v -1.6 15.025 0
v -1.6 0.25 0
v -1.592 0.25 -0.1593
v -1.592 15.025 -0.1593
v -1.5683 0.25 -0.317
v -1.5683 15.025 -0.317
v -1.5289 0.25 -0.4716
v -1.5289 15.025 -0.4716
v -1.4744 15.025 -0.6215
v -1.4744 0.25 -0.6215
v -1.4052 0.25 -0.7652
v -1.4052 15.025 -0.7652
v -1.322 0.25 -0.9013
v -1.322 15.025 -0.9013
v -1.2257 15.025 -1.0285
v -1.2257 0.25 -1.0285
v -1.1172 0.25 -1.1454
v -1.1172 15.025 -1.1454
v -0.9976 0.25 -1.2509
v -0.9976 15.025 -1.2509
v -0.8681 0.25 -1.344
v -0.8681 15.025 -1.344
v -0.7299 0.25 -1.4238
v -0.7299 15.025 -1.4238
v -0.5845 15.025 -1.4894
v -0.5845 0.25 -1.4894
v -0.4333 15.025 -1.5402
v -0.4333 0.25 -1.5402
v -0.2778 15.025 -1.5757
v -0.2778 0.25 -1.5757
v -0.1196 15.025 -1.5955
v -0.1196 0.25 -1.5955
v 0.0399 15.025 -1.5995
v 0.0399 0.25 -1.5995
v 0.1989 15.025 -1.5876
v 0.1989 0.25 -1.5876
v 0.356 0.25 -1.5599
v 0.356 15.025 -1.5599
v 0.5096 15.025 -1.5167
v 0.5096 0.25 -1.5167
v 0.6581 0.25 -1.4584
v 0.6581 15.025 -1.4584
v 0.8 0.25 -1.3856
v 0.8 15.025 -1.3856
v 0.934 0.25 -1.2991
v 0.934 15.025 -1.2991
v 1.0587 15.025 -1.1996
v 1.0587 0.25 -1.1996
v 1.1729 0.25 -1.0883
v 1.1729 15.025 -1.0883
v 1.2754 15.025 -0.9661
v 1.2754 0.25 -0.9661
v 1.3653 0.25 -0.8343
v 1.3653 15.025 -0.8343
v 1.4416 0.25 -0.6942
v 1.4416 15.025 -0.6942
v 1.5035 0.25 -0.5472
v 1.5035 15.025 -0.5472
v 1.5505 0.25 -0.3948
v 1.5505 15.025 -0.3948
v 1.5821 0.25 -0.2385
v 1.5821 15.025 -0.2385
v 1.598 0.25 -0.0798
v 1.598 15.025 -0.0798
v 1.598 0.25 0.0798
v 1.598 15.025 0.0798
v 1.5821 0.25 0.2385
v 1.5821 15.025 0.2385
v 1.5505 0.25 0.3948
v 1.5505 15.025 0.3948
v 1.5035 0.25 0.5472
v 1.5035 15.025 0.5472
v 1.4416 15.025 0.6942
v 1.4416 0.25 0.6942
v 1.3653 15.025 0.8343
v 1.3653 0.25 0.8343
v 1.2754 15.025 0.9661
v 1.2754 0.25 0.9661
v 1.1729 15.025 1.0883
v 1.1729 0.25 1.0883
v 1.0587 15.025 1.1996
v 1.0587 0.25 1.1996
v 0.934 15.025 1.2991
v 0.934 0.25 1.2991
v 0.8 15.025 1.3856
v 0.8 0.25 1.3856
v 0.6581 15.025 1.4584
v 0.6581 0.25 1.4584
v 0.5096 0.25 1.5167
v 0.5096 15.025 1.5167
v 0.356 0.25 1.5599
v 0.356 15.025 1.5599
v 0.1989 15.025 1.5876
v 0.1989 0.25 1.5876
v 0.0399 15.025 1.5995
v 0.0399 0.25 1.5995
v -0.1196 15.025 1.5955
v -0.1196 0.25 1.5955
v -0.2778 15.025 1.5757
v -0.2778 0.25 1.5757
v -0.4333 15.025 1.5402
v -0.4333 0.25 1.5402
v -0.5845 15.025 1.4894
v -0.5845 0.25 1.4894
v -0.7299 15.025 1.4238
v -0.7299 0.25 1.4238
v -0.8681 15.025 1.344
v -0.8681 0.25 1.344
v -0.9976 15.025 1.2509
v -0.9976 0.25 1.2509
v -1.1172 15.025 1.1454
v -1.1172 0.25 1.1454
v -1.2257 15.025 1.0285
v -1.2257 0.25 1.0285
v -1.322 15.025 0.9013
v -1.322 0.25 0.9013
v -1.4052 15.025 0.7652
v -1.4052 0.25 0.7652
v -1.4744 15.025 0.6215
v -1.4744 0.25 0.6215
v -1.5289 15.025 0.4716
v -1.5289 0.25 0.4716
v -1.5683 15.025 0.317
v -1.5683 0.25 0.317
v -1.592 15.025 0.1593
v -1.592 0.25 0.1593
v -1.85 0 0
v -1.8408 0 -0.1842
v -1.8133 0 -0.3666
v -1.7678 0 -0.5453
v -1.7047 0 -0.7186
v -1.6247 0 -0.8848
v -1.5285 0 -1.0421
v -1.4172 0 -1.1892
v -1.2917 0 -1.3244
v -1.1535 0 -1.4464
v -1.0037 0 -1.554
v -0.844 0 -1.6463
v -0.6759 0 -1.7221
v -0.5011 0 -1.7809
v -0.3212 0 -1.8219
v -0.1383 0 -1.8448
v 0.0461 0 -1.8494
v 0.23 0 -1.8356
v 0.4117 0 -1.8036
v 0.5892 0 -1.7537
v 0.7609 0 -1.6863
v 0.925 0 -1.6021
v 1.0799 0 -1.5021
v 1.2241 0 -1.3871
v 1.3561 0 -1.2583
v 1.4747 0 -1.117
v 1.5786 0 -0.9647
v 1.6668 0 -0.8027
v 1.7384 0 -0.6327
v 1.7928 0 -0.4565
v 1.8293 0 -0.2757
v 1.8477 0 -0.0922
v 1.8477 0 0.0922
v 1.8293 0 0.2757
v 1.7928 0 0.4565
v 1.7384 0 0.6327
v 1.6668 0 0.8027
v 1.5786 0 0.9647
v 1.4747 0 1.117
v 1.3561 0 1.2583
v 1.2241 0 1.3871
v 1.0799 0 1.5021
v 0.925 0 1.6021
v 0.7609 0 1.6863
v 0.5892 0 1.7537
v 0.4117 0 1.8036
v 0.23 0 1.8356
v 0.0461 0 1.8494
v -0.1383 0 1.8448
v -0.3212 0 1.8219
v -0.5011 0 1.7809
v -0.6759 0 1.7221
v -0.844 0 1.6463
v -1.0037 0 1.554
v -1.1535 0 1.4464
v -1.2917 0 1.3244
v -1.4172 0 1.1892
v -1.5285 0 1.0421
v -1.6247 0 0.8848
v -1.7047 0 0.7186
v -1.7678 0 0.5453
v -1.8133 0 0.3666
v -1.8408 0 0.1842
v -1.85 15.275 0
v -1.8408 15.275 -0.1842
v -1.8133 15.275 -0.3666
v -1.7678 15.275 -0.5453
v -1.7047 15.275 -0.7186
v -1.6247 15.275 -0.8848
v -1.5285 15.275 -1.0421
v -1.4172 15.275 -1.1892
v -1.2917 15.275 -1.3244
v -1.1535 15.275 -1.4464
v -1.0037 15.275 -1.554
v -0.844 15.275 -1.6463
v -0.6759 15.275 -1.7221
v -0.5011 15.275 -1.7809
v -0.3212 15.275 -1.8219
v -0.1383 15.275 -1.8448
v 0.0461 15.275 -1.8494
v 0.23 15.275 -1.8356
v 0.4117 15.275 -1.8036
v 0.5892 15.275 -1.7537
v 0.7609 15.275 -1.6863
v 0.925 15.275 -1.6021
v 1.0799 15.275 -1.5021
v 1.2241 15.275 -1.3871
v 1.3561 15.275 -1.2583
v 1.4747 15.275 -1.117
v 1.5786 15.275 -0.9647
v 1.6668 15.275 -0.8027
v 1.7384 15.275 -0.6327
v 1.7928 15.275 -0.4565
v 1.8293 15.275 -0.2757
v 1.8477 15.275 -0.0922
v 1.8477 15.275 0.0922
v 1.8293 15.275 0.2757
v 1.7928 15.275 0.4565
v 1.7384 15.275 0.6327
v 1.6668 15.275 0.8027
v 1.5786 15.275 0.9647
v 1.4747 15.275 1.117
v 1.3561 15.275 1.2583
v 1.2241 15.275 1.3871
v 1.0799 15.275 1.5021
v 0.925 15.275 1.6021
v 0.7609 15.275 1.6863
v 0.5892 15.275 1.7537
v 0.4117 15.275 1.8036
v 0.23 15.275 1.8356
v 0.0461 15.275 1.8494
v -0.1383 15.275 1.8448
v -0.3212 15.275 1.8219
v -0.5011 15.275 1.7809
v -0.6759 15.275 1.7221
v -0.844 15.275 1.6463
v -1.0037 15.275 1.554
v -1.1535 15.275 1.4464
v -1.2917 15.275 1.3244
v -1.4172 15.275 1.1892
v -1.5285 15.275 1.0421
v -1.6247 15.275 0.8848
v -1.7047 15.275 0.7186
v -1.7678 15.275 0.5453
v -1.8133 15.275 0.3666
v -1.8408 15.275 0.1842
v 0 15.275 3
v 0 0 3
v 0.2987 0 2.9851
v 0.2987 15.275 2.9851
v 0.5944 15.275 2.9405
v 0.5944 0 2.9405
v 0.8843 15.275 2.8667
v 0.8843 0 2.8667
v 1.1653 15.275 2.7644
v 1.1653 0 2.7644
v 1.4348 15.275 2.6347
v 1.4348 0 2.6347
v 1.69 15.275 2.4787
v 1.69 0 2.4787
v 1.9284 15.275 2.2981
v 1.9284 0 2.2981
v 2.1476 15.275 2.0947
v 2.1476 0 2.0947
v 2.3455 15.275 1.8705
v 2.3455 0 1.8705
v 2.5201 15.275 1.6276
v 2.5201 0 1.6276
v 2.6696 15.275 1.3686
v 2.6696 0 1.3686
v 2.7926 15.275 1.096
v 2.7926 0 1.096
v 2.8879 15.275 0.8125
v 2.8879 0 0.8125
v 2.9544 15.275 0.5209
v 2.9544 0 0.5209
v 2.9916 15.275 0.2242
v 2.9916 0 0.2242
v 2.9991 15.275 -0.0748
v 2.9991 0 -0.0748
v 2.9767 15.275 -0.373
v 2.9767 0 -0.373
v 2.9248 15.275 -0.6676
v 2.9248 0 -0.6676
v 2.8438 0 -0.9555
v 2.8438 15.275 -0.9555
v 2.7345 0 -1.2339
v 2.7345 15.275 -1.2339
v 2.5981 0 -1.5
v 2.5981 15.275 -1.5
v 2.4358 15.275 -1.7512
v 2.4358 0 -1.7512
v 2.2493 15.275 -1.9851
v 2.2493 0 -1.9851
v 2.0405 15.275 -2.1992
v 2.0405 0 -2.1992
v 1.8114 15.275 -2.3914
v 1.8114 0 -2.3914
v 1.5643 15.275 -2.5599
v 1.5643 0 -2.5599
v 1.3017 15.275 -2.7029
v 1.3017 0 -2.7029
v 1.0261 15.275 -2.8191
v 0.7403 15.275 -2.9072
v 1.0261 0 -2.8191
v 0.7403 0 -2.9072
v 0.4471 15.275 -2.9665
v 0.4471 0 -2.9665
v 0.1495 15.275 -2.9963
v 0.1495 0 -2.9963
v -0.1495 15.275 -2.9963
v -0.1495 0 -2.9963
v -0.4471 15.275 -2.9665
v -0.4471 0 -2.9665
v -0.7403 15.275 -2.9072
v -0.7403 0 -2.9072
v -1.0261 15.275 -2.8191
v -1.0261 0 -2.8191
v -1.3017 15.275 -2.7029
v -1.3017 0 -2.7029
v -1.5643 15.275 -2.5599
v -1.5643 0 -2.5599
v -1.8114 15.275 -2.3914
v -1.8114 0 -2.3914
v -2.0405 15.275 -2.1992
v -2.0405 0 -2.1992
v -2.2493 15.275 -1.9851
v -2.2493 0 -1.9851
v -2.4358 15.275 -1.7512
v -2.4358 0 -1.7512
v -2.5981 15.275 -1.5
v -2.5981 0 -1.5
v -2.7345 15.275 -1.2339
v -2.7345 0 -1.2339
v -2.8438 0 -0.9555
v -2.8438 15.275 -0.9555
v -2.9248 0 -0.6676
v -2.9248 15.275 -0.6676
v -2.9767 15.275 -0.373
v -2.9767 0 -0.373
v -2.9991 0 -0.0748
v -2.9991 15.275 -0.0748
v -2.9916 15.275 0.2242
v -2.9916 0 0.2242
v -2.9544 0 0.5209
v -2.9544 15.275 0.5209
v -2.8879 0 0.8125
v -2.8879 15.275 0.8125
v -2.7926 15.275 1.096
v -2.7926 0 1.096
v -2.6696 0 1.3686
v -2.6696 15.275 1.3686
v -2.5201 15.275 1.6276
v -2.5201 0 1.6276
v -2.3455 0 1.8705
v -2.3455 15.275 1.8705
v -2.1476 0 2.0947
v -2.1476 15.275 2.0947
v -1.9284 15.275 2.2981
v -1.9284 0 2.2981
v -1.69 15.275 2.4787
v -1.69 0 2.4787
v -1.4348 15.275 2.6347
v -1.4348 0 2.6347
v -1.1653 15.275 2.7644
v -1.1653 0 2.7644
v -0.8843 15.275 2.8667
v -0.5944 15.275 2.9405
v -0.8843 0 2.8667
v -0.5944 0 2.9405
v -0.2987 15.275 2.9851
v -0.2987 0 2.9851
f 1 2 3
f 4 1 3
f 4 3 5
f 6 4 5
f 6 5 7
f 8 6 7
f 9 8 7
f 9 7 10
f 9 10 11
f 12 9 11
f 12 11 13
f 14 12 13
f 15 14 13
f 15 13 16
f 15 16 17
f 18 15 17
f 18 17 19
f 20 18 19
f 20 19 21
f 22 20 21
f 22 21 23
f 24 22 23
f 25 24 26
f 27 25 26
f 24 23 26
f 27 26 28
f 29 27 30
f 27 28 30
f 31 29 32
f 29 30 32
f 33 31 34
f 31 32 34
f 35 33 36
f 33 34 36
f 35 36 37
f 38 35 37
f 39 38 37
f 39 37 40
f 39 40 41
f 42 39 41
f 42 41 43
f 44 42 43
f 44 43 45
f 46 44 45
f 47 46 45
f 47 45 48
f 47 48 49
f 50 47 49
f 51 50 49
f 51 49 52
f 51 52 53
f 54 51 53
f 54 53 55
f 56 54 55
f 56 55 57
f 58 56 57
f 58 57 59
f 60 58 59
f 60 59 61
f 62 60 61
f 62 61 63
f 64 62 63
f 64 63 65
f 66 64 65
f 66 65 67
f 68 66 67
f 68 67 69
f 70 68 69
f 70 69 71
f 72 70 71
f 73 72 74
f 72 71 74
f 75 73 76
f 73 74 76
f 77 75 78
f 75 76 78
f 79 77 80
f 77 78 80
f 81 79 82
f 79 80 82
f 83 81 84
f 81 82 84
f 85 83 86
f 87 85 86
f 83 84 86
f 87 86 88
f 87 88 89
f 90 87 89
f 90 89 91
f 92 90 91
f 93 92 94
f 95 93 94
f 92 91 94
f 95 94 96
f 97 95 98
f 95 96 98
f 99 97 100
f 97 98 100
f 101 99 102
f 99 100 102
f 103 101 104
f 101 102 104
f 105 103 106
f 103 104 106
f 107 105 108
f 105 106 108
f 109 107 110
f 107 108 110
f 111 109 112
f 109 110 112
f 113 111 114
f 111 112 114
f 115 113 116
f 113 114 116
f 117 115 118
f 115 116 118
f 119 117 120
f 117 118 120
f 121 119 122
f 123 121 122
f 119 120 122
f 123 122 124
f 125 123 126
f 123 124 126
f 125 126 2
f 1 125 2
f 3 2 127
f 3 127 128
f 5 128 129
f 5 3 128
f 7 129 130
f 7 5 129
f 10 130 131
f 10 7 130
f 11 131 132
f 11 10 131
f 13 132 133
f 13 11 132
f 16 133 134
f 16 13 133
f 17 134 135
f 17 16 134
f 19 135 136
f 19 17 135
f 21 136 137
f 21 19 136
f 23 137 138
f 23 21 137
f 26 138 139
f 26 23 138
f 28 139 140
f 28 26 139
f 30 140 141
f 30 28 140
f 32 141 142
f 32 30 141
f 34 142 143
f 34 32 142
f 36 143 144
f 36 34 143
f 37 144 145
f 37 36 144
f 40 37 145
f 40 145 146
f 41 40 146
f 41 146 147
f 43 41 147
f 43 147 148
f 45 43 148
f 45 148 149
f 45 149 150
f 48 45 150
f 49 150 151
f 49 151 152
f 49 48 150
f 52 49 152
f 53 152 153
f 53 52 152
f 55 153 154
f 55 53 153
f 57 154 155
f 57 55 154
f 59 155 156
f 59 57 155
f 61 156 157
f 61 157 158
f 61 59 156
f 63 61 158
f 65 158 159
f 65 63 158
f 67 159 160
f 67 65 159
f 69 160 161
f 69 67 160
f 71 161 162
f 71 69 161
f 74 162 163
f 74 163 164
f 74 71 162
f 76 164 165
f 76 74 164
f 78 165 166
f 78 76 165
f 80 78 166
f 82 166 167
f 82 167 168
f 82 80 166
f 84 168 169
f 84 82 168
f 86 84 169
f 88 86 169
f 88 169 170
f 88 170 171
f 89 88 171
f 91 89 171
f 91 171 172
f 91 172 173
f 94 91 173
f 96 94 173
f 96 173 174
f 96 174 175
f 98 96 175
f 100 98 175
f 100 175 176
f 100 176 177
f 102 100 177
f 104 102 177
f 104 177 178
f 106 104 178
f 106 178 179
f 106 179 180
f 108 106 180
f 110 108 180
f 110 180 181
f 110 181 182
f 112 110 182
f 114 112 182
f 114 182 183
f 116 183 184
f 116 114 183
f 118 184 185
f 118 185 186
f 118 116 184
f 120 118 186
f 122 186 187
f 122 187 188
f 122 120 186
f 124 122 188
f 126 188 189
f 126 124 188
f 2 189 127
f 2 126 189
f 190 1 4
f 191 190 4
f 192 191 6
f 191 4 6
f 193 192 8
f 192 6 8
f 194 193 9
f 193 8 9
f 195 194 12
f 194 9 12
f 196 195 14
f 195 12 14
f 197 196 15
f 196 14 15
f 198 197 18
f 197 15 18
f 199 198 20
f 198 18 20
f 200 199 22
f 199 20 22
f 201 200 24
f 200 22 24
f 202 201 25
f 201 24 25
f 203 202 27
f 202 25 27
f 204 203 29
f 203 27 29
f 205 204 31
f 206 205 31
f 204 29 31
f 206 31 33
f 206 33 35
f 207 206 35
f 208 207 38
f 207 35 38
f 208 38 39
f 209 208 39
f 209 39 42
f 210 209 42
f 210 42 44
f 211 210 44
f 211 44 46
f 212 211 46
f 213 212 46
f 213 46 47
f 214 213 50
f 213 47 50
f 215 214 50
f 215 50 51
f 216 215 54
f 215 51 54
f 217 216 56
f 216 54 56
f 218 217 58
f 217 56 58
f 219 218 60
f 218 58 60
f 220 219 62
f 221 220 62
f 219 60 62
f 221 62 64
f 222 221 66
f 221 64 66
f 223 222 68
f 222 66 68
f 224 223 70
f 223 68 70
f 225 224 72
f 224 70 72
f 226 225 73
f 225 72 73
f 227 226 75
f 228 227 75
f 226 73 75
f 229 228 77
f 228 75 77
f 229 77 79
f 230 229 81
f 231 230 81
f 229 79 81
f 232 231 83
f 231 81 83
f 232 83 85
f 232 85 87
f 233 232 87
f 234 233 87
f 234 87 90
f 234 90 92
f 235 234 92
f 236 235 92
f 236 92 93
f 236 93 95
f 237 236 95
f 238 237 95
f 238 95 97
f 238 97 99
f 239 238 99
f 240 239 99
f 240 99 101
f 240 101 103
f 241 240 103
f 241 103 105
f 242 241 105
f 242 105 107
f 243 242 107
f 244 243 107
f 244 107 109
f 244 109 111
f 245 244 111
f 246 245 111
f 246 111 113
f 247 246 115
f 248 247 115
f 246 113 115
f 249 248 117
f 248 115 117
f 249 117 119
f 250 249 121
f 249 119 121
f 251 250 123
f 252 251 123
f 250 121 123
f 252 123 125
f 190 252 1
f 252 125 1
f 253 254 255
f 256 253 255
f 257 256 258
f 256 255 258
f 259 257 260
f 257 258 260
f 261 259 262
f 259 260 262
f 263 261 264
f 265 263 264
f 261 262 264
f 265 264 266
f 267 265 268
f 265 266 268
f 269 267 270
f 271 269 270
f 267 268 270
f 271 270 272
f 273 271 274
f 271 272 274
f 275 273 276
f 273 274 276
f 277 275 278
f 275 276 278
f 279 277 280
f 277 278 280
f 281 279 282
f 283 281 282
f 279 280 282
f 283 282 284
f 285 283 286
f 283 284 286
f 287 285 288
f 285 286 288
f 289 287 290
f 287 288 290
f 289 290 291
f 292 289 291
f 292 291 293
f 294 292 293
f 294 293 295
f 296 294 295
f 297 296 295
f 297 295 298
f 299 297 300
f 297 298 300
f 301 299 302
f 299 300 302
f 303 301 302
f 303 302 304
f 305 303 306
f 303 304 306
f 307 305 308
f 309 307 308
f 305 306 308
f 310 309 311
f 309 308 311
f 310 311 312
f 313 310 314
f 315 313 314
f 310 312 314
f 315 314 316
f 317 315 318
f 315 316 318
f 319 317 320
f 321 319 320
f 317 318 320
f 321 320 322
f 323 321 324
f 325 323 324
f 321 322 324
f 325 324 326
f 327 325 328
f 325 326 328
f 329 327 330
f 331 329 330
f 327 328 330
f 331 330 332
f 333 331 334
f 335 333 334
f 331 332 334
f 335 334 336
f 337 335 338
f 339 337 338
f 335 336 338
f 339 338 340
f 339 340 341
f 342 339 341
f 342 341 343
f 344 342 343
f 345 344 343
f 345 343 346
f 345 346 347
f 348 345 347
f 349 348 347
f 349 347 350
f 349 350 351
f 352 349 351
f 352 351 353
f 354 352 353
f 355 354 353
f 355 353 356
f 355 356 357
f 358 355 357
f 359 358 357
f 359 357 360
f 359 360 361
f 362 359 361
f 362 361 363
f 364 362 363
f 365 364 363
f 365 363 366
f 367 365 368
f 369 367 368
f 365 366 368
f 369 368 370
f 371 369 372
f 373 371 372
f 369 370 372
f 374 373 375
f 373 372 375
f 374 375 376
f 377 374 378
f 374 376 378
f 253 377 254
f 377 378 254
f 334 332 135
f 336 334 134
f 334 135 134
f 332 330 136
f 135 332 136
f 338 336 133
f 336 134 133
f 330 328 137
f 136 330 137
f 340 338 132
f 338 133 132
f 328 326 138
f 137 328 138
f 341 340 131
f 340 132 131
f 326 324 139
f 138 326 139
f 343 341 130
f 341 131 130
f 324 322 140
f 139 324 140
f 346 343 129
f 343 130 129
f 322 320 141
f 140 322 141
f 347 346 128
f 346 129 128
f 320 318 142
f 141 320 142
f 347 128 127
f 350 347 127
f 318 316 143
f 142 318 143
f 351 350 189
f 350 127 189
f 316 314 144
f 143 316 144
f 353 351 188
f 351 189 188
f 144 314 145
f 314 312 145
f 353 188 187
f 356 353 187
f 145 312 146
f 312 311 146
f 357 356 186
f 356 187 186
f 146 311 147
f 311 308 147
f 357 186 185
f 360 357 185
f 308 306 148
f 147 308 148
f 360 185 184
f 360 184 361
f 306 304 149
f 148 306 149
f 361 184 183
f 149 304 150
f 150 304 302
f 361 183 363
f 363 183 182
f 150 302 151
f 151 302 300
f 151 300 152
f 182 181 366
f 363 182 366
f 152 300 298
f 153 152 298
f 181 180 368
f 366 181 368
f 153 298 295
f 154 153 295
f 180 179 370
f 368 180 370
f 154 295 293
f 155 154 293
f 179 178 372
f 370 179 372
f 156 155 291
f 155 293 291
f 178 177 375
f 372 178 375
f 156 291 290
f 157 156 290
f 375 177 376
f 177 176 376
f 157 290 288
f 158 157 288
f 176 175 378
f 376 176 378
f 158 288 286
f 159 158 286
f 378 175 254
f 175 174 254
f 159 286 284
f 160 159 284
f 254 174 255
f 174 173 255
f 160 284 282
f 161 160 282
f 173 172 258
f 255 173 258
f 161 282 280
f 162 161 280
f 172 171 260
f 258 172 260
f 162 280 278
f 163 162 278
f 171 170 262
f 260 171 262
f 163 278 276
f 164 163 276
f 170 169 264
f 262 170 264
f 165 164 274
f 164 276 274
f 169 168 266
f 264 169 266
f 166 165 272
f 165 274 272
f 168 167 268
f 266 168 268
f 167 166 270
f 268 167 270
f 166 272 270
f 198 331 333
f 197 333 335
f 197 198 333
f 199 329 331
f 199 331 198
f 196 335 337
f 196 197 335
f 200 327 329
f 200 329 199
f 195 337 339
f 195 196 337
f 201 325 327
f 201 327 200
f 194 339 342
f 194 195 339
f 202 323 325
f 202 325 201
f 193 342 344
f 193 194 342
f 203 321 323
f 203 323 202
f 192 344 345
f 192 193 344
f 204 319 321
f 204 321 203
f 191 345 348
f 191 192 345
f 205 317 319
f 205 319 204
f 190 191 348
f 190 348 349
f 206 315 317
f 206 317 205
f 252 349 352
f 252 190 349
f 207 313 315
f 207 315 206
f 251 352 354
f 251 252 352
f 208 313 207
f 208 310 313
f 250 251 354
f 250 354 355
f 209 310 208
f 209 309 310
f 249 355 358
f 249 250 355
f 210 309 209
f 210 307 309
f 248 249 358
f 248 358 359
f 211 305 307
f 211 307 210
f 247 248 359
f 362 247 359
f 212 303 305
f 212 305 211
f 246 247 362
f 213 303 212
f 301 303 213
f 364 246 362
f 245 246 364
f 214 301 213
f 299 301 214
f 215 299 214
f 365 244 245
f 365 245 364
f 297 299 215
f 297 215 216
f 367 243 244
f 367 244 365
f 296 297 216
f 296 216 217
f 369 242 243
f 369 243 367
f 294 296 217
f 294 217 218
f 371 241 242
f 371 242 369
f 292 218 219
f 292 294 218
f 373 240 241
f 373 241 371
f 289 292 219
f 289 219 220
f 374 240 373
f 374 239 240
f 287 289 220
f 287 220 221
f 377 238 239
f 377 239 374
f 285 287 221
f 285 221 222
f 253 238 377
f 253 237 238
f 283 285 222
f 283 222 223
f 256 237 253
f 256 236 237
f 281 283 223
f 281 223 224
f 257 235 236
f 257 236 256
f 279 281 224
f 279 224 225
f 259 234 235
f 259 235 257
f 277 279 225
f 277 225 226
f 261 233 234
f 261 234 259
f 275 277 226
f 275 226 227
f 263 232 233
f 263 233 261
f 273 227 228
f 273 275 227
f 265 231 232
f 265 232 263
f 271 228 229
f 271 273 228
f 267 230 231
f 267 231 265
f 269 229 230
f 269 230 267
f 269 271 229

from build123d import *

# Parameters (mm, degrees)
SKETCH1_R            = 3
BOSS_EXTRUDE1_DEPTH  = 15.275
M3_CLEARANCE_HOLE1_D = 3.2
CHAMFER1_SIZE        = 0.25


with BuildPart() as part:
    # Sketch1 → Boss-Extrude1 (new body)
    with BuildSketch(Plane(origin=(0, 0, 0), x_dir=(1, 0, 0), z_dir=(0, 1, 0))):
        with Locations(Location((0, 0, 0), (0, 0, 270))):
            Circle(SKETCH1_R)
    extrude(amount=BOSS_EXTRUDE1_DEPTH)

    # M3 Clearance Hole1 (through all)
    with Locations(Plane(origin=(0, 15.275, 0), x_dir=(1, 0, 0), z_dir=(0, 1, 0))):
        with Locations((0, 0)):
            Hole(M3_CLEARANCE_HOLE1_D / 2)

    # Chamfer1
    chamfer1_edges = [part.edges().sort_by_distance(p)[0] for p in [
        (1.6, 15.275, 0),
        (1.6, 0, 0),
    ]]
    chamfer(chamfer1_edges, length=CHAMFER1_SIZE)


solid = part.part
